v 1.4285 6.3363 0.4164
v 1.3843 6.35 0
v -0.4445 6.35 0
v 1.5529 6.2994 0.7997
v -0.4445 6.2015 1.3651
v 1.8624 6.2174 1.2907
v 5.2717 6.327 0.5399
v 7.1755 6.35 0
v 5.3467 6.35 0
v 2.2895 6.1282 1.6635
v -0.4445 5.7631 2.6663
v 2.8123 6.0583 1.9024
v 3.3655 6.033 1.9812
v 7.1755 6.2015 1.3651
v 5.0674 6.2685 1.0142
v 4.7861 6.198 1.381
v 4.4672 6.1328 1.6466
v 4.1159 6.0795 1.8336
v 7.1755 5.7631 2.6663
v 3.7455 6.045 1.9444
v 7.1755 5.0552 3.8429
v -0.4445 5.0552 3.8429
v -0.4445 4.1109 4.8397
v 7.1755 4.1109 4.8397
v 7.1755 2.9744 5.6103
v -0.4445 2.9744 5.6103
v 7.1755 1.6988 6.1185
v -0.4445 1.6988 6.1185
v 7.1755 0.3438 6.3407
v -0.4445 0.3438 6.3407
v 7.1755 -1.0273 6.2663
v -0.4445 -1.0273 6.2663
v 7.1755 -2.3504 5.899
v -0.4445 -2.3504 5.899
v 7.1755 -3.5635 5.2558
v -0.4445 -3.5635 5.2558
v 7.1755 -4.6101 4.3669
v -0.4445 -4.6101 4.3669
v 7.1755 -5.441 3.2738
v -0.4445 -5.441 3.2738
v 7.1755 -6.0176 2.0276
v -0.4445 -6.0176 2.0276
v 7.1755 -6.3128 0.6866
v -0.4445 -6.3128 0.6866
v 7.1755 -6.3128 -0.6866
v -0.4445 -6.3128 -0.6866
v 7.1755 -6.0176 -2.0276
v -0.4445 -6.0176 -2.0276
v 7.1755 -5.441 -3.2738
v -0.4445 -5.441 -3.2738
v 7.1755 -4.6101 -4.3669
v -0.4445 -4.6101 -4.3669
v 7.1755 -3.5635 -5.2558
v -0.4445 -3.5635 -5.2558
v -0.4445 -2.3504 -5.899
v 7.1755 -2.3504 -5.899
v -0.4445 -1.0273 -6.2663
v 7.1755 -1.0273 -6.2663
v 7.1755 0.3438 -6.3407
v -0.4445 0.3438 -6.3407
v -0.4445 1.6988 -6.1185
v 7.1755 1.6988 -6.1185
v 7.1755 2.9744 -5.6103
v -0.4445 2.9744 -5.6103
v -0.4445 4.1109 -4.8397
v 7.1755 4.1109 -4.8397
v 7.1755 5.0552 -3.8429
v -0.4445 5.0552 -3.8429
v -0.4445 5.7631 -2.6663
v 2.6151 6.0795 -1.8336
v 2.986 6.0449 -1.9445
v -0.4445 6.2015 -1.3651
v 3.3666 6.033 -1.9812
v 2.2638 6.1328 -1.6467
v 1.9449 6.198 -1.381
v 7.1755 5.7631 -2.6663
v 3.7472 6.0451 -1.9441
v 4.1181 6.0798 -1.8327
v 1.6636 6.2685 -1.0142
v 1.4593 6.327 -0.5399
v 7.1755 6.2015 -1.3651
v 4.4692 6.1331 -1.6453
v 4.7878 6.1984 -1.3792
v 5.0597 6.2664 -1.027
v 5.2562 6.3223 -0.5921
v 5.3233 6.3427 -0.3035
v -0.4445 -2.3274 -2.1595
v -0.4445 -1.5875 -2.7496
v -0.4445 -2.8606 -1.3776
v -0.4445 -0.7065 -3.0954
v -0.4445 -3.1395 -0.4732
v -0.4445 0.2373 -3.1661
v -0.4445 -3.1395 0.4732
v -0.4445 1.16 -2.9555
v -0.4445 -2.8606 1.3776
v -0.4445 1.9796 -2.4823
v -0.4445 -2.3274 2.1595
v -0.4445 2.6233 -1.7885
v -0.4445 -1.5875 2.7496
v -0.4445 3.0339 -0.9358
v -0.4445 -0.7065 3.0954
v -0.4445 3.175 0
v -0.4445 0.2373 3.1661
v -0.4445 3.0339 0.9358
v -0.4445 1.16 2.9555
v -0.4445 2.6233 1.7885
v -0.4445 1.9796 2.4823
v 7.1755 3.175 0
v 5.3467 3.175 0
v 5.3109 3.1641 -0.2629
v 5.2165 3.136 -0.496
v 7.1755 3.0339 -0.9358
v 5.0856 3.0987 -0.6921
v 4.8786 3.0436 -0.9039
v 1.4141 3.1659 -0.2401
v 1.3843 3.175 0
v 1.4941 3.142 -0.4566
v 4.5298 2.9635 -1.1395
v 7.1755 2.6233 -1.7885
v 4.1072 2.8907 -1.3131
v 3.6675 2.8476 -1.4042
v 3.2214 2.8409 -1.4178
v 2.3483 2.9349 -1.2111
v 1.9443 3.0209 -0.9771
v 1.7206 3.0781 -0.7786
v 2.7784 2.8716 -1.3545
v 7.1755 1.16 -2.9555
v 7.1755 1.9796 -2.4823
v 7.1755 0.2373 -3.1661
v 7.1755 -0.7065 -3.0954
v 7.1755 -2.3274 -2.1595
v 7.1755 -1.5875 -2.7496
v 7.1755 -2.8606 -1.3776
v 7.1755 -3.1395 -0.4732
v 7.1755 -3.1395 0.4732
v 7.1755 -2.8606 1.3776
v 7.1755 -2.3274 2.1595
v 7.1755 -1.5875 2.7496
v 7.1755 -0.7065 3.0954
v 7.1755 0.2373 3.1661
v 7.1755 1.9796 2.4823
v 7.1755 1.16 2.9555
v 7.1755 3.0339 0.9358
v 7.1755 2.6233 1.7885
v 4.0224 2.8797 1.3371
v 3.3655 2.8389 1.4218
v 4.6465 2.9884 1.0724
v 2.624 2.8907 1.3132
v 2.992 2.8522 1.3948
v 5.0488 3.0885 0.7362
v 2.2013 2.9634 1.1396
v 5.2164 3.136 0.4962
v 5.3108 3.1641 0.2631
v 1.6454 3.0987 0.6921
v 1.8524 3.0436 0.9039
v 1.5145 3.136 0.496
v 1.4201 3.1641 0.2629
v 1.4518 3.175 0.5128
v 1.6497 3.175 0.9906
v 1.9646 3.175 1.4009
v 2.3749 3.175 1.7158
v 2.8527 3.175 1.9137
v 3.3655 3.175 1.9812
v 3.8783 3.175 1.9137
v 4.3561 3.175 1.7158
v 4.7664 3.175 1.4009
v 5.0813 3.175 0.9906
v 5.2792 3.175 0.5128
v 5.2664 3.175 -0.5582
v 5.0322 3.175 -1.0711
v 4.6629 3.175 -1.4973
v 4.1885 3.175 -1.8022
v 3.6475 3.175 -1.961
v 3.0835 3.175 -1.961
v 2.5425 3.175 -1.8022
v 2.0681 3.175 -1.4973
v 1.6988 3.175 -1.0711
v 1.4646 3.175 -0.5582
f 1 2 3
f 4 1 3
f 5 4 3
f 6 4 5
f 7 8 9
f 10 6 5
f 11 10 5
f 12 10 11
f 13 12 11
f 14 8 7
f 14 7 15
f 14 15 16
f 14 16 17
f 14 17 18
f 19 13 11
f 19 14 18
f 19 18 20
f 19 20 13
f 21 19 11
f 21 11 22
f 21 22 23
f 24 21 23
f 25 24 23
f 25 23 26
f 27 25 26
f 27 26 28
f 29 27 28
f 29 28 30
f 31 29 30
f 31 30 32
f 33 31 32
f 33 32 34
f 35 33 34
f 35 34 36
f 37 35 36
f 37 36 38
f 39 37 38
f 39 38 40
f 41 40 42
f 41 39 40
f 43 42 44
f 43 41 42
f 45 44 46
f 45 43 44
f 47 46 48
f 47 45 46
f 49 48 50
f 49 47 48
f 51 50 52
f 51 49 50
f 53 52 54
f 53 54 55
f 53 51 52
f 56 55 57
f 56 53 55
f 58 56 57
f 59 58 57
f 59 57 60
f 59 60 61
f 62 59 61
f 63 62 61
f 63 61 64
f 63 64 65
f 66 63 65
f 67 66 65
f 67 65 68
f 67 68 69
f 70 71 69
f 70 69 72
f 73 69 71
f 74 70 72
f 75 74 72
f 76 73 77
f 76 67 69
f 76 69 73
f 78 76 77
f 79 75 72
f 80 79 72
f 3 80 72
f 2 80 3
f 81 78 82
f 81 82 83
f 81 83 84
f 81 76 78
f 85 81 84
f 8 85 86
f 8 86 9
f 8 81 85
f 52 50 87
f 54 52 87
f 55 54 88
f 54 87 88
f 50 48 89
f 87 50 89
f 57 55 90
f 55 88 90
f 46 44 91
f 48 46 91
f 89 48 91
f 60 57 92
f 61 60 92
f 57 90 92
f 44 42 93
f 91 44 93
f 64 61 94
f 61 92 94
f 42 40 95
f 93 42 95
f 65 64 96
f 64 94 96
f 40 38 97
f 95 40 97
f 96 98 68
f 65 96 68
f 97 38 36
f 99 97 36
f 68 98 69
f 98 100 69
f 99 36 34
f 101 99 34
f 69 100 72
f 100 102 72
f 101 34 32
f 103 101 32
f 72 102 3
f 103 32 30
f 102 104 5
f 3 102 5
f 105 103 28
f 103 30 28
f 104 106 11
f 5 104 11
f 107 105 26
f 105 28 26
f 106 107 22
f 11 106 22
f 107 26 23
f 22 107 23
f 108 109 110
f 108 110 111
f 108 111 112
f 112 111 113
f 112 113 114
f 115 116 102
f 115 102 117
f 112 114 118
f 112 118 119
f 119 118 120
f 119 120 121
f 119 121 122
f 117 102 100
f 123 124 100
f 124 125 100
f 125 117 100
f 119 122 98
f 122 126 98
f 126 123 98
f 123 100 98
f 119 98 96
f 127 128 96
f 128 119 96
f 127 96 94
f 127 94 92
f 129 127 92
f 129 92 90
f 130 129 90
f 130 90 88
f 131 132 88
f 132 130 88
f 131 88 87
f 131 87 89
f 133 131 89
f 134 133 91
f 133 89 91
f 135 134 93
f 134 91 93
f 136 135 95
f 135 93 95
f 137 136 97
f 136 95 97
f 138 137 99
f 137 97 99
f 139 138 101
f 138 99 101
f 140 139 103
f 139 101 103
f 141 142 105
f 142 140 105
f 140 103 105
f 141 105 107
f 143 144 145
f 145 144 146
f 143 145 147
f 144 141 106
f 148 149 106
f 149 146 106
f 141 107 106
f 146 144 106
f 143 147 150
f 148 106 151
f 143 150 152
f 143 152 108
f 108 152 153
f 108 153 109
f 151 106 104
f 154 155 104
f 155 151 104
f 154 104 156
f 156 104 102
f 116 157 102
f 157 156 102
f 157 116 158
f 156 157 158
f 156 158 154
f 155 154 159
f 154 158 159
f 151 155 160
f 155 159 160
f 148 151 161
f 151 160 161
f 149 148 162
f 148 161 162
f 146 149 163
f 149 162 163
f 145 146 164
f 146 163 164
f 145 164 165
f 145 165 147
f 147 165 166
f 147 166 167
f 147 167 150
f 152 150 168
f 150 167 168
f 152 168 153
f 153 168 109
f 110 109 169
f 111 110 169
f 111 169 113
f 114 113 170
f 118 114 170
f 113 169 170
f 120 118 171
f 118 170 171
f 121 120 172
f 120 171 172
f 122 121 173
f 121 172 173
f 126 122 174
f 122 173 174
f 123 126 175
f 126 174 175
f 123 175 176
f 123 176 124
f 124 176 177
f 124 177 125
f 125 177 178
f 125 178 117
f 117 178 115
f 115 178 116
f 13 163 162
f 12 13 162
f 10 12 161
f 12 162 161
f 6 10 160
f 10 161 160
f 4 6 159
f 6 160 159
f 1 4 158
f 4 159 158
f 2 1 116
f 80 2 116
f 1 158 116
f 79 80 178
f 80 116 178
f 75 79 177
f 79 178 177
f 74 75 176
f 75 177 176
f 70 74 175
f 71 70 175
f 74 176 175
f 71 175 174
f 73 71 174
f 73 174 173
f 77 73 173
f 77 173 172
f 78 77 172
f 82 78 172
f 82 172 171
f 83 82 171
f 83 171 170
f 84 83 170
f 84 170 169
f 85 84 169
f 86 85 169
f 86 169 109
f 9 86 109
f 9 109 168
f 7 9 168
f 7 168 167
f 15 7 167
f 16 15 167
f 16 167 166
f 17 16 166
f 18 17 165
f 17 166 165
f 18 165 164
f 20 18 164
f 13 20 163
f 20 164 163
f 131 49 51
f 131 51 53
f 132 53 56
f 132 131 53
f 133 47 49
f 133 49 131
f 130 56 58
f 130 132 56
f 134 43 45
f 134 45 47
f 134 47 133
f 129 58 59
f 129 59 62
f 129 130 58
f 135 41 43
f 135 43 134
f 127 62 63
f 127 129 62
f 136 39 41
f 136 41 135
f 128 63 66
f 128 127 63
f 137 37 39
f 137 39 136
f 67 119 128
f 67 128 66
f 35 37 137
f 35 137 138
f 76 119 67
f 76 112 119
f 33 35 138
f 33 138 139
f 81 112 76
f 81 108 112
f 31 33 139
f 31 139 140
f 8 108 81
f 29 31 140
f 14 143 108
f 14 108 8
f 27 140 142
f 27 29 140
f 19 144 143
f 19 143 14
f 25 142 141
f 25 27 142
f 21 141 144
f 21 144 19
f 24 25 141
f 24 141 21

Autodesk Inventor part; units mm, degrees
ref_plane "YZ Plane" through (0, 0, 0) normal (1, 0, 0) x (0, 1, 0)
ref_plane "XZ Plane" through (0, 0, 0) normal (0, 1, 0) x (-1, 0, 0)
sketch "Sketch2" plane through (0, 0, 0) normal (0, 0, 1) x (1, 0, 0)
  line L0 (0, 0) -> (7.62, 0)
  line L1 (-0.4445, 6.35) -> (7.1755, 6.35)
  line L2 (7.1755, 6.35) -> (7.1755, 3.175)
  line L3 (7.1755, 3.175) -> (-0.4445, 3.175)
  line L4 (-0.4445, 3.175) -> (-0.4445, 6.35)
  point P0 (3.3655, 6.35)
  dimension "d8" = 7.62
  dimension "d9" = 3.175
  dimension "d10" = 7.62
  dimension "d11" = 3.175
revolve "Revolution1" add sketch "Sketch2" angle 360 about axis through (0, 0, 0) along (1, 0, 0)
ref_plane "Work Plane1" through (3.3655, 6.35, 0) normal (0, 1, 0) x (-1, 0, 0)
sketch "Sketch3" plane through (3.3655, 6.35, 0) normal (0, 1, 0) x (-1, 0, 0)
  point P0 (3.3655, 0)
  point P1 (0, 0)
hole "Hole1" at (3.3655, 6.35, 0) direction (0, -1, 0) diameter 3.9624 depth 3.175 tip angle 118 thread size "10-32 UNF" class "2B" standard "ANSI Unified Screw Threads"
equation "\"d10\" = d8"
properties part number "Collar" material "Aluminum 6061"
